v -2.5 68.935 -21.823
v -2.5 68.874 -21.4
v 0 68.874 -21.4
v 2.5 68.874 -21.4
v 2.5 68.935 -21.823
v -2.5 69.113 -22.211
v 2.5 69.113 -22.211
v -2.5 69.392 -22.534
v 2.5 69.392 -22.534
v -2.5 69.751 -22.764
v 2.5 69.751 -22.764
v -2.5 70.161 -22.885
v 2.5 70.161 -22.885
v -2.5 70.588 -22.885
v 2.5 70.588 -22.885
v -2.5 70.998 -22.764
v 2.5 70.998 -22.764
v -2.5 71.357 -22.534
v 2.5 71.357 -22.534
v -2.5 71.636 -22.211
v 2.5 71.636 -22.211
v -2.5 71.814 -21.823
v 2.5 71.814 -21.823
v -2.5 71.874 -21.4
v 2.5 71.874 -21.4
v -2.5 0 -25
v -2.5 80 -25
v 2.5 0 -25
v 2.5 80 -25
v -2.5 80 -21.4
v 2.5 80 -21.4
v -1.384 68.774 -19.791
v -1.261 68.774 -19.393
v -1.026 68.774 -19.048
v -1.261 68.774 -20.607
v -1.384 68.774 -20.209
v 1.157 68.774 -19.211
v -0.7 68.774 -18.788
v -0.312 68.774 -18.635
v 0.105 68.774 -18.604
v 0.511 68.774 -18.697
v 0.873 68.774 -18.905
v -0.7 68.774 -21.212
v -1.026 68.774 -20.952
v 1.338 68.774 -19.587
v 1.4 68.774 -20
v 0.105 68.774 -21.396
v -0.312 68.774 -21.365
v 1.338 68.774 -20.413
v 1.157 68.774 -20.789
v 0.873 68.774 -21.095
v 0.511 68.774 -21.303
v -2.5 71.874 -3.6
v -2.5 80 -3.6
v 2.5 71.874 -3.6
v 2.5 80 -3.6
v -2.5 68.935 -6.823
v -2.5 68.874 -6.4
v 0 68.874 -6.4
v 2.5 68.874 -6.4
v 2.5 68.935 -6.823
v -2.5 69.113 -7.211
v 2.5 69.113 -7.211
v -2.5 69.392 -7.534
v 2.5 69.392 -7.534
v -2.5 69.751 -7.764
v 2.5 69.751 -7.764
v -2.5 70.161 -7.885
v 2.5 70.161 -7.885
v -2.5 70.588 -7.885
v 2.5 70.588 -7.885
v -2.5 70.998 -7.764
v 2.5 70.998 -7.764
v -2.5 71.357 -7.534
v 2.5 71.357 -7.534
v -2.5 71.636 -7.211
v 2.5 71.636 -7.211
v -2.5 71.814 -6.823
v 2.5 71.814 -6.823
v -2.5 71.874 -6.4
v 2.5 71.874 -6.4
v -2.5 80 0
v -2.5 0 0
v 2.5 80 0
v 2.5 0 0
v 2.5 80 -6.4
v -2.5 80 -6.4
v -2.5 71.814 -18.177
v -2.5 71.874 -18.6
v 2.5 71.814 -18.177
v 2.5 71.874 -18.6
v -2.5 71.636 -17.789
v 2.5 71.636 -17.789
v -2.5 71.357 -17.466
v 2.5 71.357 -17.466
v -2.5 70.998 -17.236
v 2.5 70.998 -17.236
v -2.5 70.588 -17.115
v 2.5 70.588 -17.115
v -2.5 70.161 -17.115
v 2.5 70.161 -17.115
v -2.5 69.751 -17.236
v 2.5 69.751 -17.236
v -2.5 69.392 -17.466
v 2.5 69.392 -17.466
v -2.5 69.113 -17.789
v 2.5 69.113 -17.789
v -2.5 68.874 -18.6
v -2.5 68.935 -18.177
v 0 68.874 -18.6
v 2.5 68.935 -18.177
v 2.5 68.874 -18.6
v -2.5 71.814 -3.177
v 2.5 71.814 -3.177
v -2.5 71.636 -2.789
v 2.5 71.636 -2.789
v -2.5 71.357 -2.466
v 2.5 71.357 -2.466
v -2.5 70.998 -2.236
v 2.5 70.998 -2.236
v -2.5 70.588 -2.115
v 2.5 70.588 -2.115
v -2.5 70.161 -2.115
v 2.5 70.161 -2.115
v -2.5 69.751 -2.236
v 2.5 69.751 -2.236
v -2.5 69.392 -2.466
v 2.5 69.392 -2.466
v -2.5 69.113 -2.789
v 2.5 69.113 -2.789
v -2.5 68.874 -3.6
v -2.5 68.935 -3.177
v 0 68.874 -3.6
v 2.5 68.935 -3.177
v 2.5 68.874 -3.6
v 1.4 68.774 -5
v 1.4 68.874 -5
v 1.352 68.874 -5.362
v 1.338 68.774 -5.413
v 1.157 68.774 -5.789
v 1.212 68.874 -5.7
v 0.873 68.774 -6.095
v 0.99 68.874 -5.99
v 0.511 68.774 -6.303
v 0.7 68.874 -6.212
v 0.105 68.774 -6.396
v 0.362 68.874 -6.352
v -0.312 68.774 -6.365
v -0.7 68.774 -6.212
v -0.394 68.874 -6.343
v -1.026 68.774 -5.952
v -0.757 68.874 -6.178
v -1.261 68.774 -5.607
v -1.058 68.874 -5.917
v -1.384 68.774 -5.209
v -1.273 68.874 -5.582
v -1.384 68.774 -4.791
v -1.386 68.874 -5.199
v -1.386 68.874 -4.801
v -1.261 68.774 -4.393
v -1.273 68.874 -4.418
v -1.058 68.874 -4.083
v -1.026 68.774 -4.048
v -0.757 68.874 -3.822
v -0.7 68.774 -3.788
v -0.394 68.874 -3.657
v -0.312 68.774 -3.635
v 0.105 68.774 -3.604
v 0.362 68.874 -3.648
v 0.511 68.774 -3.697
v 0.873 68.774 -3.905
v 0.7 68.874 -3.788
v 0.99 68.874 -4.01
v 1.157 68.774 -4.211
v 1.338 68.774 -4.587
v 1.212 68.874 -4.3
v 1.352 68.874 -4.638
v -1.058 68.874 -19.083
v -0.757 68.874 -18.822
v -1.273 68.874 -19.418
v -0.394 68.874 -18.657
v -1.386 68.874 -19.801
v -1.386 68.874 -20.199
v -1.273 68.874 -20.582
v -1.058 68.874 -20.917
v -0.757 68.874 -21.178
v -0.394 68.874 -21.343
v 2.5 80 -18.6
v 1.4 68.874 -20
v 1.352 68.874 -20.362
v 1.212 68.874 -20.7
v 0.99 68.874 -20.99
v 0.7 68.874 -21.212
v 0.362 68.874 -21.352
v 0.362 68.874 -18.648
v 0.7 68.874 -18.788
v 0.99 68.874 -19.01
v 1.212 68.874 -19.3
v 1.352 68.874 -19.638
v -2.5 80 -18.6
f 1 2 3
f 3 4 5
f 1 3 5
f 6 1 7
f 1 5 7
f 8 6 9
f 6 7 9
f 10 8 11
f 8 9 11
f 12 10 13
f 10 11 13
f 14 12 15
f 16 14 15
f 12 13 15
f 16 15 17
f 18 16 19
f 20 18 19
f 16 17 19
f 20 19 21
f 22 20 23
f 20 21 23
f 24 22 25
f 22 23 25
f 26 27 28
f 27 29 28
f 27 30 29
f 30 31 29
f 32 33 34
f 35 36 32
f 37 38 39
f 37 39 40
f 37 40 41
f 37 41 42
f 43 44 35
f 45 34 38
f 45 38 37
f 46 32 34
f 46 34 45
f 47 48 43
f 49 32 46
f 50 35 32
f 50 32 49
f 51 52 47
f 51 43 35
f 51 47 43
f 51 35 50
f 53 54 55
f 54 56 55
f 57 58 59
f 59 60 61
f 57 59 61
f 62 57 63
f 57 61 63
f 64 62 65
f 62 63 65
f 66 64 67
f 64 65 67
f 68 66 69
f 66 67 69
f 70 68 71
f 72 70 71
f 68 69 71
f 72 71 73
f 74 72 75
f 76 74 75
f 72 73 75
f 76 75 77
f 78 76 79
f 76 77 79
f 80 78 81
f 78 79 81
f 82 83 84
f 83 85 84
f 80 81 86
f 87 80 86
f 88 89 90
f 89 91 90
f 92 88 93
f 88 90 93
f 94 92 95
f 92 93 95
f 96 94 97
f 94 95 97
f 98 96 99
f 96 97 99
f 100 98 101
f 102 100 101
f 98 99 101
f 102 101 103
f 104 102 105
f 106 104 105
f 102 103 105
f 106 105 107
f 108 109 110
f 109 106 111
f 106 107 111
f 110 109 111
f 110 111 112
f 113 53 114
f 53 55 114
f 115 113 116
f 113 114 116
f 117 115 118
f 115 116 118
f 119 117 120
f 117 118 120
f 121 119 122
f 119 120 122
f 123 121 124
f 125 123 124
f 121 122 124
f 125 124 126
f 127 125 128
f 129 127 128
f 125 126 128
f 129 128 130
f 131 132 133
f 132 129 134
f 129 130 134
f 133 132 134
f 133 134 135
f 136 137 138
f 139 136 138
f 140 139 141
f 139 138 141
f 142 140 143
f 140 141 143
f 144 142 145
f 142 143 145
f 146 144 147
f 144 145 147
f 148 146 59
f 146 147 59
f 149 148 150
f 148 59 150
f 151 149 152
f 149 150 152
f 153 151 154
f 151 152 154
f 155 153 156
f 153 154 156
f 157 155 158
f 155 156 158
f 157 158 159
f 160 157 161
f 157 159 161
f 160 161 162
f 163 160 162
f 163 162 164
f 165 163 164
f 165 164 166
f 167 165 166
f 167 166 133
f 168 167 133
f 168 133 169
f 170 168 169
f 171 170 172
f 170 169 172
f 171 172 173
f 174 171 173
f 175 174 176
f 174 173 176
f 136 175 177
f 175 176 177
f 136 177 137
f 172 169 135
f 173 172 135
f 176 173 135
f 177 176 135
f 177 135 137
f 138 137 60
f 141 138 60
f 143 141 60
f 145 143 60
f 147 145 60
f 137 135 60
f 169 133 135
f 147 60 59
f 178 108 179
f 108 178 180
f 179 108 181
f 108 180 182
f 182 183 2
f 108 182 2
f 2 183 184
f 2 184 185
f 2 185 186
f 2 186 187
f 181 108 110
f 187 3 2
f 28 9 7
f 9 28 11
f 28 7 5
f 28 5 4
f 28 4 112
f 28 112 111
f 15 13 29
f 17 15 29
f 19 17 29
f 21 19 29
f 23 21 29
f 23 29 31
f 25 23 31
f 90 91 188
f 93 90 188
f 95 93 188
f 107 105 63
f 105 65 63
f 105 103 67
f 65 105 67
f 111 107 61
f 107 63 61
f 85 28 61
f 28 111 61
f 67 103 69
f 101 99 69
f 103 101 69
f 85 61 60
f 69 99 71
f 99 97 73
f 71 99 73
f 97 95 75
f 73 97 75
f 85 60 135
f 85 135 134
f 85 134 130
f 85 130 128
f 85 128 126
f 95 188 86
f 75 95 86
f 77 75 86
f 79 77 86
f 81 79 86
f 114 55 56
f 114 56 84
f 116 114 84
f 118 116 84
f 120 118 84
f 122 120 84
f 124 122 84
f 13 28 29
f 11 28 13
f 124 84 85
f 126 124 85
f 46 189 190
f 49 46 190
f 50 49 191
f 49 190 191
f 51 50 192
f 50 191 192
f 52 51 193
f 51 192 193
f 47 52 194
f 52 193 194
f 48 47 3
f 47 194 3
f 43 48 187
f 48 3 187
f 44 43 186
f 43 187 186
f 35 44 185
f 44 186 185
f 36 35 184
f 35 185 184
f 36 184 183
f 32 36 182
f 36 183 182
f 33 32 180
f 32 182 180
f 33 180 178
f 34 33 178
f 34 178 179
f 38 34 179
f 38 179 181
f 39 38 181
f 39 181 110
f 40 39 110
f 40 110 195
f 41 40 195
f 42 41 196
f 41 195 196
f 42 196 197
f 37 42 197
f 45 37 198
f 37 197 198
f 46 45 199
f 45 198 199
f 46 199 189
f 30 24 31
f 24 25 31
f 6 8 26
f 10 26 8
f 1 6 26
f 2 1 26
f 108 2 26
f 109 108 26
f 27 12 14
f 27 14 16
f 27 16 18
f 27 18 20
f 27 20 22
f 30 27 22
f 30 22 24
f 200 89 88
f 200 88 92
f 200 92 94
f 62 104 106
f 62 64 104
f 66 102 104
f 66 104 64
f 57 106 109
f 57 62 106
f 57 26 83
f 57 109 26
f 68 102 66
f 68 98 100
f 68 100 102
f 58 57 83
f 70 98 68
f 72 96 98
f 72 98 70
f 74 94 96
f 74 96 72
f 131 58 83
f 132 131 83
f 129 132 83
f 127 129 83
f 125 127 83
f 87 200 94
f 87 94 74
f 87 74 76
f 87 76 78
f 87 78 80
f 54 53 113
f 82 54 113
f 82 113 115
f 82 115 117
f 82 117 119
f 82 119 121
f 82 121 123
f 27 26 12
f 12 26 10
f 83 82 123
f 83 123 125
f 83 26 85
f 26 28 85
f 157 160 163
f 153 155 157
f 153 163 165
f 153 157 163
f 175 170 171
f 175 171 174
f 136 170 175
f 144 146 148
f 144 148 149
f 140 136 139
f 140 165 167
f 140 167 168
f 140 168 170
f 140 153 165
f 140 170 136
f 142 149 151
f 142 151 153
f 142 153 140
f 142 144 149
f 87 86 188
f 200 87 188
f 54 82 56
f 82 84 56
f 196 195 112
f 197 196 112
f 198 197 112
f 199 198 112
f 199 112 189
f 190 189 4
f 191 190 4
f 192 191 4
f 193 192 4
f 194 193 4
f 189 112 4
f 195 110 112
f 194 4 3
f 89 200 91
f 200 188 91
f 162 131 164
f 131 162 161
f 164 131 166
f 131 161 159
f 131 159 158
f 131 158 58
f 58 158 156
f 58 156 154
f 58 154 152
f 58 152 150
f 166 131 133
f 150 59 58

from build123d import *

# Parameters (mm, degrees)
EXTRUDE_1_DEPTH     = 2.5
SKETCH_2_R          = 1.4
CUT_EXTRUDE_1_DEPTH = 0.1


with BuildPart() as part:
    # 草图1 → 凸台-拉伸1 (new body, symmetric)
    with BuildSketch(Plane(origin=(0, 0, 0), x_dir=(0, 0, -1), z_dir=(1, 0, 0))):
        with BuildLine():
            Line((6.4, 80), (18.6, 80))
            Line((18.6, 80), (18.6, 71.8744))
            ThreePointArc((18.6, 71.8744), (17.1, 70.3744), (18.6, 68.8744))
            Line((18.6, 68.8744), (21.4, 68.8744))
            ThreePointArc((21.4, 68.8744), (22.9, 70.3744), (21.4, 71.8744))
            Line((21.4, 71.8744), (21.4, 80))
            Line((21.4, 80), (25, 80))
            Line((25, 80), (25, 0))
            Line((25, 0), (0, 0))
            Line((0, 0), (0, 80))
            Line((0, 80), (3.6, 80))
            Line((3.6, 80), (3.6, 71.8744))
            ThreePointArc((3.6, 71.8744), (2.1, 70.3744), (3.6, 68.8744))
            Line((3.6, 68.8744), (6.4, 68.8744))
            ThreePointArc((6.4, 68.8744), (7.9, 70.3744), (6.4, 71.8744))
            Line((6.4, 71.8744), (6.4, 80))
        make_face()
    extrude(amount=EXTRUDE_1_DEPTH, both=True)

    # 草图2 → 切除-拉伸1 (cut)
    with BuildSketch(Plane(origin=(0, 68.8744, 0), x_dir=(1, 0, 0), z_dir=(0, 1, 0))):
        with Locations((0, 20)):
            Circle(SKETCH_2_R)
        with Locations((0, 5)):
            Circle(SKETCH_2_R)
    extrude(amount=-CUT_EXTRUDE_1_DEPTH, mode=Mode.SUBTRACT)


solid = part.part
